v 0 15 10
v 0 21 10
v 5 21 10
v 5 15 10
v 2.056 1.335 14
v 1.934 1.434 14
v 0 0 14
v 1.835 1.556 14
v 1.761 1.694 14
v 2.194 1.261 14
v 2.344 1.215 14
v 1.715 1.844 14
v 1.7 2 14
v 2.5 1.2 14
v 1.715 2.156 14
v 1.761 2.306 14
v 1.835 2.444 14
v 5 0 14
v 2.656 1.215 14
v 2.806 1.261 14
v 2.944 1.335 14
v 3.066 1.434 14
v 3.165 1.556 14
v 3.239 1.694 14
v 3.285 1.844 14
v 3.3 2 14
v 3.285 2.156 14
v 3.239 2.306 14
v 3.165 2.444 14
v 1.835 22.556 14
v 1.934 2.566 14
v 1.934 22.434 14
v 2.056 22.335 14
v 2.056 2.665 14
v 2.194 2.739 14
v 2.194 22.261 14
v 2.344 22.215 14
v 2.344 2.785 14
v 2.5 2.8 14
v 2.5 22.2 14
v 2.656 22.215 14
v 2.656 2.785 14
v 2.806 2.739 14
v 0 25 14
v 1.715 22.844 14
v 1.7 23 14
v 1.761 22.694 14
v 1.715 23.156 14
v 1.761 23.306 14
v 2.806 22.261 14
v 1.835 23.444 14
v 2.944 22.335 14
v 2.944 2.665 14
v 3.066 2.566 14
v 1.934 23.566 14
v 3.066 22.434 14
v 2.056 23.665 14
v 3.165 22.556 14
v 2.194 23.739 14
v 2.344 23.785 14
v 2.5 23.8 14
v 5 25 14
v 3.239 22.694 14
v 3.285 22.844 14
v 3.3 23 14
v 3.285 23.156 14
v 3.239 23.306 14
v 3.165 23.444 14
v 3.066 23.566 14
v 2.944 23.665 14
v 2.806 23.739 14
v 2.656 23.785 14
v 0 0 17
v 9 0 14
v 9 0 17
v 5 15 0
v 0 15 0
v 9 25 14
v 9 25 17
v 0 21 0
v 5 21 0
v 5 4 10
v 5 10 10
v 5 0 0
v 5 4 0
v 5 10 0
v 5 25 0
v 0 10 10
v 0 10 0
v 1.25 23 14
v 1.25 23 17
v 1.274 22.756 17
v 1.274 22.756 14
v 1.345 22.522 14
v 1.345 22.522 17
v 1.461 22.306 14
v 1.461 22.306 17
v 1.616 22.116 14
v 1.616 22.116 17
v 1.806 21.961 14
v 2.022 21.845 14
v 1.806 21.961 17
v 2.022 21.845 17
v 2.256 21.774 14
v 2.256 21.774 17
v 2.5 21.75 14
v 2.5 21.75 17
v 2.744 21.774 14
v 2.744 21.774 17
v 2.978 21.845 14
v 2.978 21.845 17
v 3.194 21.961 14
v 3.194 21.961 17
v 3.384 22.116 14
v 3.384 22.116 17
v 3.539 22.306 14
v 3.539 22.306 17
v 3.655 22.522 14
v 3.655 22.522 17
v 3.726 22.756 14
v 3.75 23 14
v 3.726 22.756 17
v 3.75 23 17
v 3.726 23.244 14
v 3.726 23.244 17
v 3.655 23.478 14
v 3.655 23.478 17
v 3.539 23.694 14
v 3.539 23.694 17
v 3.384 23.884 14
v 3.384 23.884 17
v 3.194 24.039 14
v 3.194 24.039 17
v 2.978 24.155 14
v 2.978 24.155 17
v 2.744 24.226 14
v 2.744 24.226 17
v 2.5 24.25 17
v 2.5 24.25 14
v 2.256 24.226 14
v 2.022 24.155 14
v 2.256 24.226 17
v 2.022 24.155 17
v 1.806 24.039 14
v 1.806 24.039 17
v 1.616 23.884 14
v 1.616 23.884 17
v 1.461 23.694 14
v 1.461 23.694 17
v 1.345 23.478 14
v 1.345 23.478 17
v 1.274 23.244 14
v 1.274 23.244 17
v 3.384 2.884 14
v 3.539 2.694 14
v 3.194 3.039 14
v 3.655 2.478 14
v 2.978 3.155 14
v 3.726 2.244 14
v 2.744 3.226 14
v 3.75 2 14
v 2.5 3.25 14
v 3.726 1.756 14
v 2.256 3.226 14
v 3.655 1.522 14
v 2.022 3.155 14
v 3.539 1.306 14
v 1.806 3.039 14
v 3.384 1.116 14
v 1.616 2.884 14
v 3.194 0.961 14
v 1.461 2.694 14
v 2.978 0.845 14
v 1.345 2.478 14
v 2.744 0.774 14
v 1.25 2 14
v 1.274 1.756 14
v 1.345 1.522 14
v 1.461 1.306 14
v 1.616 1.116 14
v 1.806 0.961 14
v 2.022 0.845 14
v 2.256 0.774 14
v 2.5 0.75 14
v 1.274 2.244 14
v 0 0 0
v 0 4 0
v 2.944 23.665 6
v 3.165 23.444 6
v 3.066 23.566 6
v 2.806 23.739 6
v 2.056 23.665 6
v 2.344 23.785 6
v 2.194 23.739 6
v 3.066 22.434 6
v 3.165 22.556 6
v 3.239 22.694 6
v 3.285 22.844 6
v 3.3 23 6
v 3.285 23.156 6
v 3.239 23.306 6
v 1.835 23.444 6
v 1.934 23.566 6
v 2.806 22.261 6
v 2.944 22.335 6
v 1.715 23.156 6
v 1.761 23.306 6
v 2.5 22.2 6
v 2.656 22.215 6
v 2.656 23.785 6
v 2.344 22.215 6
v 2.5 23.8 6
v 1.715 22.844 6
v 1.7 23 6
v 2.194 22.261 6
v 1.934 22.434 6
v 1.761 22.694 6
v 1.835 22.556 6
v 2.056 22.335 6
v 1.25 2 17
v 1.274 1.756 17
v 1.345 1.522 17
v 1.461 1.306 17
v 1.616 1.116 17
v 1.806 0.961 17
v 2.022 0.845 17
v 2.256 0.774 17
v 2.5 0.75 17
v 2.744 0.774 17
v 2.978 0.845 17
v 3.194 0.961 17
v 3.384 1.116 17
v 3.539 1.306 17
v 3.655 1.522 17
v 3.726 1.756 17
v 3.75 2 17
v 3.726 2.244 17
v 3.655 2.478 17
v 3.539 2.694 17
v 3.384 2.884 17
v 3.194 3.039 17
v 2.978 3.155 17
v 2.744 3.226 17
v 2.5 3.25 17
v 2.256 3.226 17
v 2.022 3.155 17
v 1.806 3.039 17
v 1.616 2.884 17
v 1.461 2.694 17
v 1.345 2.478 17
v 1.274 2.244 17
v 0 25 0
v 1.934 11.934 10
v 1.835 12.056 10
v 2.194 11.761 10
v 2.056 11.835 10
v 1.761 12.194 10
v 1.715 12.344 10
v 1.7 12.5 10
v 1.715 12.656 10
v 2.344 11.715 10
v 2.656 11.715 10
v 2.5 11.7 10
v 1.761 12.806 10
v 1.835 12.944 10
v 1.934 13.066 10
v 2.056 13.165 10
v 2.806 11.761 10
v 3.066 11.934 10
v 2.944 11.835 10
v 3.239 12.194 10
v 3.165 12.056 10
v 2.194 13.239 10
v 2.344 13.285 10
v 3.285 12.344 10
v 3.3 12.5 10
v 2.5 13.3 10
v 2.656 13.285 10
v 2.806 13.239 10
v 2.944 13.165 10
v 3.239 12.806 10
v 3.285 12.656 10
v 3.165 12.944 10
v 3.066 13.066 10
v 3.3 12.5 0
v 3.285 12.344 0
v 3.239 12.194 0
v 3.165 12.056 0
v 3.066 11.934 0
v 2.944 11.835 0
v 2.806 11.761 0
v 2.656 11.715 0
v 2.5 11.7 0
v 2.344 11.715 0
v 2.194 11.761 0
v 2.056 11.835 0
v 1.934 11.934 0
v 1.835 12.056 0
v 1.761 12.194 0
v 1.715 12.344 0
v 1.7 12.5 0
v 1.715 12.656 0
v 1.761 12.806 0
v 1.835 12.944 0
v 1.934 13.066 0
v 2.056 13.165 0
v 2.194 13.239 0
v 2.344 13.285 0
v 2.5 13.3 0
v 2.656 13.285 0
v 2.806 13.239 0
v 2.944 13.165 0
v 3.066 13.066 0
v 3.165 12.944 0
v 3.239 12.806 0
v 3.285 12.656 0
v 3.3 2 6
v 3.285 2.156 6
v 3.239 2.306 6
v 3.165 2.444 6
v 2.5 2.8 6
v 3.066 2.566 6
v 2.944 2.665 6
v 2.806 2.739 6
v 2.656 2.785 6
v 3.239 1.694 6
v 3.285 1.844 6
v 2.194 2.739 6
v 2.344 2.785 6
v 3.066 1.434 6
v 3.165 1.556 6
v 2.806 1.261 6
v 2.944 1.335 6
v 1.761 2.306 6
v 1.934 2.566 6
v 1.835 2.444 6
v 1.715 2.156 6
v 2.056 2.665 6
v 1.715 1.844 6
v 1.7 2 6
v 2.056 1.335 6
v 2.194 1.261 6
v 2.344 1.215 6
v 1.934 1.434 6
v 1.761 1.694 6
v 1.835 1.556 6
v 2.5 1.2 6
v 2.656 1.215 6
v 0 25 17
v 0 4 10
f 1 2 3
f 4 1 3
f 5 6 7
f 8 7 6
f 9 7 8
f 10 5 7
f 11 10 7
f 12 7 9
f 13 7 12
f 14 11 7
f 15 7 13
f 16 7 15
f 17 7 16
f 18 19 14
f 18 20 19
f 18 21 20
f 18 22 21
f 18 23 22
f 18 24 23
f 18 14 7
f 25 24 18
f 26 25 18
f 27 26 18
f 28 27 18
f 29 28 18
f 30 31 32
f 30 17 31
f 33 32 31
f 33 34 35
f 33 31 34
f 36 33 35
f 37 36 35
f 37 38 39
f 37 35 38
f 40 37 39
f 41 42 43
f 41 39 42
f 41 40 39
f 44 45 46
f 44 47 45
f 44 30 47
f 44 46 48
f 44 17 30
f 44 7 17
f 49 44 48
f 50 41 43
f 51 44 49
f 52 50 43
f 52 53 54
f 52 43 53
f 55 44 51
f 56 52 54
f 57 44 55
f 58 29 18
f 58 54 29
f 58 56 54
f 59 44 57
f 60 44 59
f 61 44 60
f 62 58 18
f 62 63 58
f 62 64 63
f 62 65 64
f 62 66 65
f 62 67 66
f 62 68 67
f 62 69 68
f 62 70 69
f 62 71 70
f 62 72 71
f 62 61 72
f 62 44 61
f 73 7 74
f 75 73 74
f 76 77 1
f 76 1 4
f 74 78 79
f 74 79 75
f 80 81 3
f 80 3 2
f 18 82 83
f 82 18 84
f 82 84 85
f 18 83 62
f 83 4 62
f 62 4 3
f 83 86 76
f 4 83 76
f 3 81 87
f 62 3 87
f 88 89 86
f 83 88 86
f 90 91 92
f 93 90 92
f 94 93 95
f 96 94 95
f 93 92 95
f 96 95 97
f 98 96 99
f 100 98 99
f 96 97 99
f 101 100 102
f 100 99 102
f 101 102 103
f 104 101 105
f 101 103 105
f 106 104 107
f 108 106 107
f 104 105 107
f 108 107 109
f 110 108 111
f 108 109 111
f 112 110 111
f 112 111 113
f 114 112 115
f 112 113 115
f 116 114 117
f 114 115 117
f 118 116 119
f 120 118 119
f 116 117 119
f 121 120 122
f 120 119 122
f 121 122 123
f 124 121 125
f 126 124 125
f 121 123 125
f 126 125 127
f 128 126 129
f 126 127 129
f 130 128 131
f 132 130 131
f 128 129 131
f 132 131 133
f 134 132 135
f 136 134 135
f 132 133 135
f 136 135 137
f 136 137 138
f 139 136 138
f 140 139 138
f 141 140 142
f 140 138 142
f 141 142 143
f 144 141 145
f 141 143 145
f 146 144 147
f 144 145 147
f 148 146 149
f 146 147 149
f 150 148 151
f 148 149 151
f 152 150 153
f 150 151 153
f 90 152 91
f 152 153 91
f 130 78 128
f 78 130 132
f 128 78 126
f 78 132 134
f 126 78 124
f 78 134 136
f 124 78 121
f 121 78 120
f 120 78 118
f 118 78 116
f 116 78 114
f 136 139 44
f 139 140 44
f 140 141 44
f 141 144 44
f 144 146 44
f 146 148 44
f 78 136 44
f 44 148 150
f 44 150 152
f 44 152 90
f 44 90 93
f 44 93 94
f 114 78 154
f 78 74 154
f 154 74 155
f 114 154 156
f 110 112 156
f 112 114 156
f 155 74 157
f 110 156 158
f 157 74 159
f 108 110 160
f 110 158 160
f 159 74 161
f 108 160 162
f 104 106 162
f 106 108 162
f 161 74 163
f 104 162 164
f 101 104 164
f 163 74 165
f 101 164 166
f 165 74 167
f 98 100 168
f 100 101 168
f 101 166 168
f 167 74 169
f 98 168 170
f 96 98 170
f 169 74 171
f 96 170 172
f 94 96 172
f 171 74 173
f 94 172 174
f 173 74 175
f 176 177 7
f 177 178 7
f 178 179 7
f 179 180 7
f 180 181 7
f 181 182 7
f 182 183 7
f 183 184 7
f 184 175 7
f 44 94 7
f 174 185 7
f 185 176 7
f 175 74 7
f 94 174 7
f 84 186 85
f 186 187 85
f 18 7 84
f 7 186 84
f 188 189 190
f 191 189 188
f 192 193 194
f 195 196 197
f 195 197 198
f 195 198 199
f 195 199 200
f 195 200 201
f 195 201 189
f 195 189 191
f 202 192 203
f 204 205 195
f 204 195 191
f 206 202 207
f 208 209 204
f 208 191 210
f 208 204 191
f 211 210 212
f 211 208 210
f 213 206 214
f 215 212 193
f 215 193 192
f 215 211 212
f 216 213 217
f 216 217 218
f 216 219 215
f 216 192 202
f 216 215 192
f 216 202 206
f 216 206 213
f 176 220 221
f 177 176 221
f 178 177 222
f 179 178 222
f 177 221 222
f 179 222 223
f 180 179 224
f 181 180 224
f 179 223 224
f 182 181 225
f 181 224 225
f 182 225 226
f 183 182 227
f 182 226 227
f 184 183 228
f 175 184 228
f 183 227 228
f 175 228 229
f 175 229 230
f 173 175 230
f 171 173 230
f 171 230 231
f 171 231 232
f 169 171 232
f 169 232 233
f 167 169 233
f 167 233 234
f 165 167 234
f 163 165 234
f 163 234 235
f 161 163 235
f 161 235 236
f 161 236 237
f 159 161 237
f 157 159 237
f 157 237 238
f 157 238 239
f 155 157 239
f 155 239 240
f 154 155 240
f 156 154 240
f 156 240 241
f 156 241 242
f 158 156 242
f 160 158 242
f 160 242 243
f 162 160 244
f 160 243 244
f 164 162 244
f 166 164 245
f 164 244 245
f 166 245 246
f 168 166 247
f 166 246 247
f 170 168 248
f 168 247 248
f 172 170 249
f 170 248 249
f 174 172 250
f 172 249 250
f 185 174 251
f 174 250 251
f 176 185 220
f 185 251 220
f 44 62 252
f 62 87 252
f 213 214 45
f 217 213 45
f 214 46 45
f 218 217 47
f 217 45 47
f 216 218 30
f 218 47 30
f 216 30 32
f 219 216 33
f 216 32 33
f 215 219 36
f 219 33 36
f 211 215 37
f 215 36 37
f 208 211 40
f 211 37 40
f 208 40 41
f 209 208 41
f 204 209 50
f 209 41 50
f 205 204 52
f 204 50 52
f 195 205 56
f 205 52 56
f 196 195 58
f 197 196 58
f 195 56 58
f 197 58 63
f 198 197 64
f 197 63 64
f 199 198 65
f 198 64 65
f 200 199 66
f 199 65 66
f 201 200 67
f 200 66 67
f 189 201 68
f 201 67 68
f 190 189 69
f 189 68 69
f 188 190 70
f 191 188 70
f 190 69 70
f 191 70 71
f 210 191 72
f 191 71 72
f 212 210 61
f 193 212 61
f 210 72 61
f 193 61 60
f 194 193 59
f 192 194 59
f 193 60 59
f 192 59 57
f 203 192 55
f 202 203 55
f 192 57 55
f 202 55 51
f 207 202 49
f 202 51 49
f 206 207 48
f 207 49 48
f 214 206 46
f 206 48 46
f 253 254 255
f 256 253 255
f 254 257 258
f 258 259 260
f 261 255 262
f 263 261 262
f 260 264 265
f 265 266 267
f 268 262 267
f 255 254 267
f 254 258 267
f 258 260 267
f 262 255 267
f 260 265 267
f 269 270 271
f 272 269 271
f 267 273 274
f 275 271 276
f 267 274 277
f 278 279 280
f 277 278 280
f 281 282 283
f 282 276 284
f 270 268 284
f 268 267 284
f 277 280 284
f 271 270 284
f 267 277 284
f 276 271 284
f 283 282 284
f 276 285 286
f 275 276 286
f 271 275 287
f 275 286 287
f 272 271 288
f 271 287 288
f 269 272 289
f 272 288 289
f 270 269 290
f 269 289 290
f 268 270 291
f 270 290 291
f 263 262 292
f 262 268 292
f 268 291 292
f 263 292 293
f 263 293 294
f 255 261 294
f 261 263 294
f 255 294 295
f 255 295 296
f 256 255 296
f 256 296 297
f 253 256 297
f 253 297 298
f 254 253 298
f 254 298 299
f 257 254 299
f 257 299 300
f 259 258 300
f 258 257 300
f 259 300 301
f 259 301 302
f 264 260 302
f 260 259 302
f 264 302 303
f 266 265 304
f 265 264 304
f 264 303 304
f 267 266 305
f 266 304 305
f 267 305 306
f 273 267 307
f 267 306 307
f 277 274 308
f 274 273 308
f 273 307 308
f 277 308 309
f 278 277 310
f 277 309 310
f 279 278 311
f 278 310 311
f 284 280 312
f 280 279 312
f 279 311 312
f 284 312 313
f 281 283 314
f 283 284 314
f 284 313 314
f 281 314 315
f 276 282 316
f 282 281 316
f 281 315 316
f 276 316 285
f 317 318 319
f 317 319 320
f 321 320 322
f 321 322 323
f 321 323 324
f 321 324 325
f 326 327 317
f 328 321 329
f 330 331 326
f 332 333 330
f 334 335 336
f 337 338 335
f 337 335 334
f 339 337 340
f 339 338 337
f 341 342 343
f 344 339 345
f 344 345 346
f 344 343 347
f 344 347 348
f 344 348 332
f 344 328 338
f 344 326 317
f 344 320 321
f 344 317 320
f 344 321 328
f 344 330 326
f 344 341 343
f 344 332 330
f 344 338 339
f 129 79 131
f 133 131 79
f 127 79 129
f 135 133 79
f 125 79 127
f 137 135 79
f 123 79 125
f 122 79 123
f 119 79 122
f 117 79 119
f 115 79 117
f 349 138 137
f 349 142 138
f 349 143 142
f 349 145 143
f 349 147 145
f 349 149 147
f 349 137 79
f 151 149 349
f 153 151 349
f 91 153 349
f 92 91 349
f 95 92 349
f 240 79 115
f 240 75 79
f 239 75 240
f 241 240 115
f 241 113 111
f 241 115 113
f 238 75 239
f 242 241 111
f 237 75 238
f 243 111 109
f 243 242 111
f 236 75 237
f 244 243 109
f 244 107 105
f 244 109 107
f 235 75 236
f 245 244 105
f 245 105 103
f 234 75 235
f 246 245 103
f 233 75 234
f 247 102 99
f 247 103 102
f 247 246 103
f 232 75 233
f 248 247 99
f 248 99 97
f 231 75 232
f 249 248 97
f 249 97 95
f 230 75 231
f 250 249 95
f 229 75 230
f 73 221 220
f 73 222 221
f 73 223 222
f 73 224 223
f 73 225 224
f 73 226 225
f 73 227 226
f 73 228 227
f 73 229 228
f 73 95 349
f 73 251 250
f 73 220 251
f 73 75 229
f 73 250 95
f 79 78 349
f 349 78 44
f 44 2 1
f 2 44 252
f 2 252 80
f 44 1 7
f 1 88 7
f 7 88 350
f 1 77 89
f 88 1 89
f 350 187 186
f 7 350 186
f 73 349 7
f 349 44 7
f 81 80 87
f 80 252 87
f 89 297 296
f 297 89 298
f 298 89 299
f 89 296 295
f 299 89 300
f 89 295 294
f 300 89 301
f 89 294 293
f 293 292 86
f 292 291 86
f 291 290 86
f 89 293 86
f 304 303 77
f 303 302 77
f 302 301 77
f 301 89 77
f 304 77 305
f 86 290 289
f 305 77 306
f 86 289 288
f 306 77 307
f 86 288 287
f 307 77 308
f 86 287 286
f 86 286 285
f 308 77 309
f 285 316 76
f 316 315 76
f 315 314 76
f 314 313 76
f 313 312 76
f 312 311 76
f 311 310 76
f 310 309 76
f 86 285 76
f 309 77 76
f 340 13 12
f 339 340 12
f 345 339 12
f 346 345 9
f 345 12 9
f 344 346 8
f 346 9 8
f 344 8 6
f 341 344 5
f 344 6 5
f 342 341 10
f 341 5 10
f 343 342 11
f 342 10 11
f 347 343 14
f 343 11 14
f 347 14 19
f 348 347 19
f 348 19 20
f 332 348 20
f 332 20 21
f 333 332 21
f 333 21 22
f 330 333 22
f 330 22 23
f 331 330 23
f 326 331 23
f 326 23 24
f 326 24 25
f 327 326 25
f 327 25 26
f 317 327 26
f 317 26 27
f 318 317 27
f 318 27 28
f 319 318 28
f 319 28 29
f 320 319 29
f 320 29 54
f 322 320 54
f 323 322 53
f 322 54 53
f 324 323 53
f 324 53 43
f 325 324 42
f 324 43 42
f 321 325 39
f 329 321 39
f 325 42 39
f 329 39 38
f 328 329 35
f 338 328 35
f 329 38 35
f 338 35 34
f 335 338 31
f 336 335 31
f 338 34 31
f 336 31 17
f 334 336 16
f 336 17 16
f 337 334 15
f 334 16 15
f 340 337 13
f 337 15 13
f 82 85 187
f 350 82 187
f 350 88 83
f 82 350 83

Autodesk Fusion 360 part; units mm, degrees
sketch "Sketch1" plane through (0, 0, 0) normal (0, 0, 1) x (1, 0, 0)
  line L0 (0, 0) -> (5, 0)
  line L1 (5, 0) -> (5, 25)
  line L2 (5, 25) -> (0, 25)
  line L3 (0, 25) -> (0, 0)
  circle A0 centre (2.5, 12.5) radius 0.8
  line L4 (0, 10) -> (5, 10)
  line L5 (5, 10) -> (5, 4)
  line L6 (5, 4) -> (0, 4)
  line L7 (0, 4) -> (0, 10)
  line L8 (0, 15) -> (3, 15)
  line L9 (3, 15) -> (3, 14)
  line L10 (3, 14) -> (0, 14)
  line L11 (0, 14) -> (0, 15)
  line L12 (0, 15) -> (5, 15)
  line L13 (5, 15) -> (5, 21)
  line L14 (5, 21) -> (0, 21)
  line L15 (0, 21) -> (0, 15)
  dimension "d1" = 5
  dimension "d2" = 25
  dimension "d3" = 1.6
  dimension "d8" = 6
  dimension "d9" = 6
extrude "Extrude1" add sketch "Sketch1" along normal blind 14 contours L0 L1 L3 L6 | L1 L3 L4 L5 L6 L7 | L1 L3 L4 L9 L10 L12 | L3 L8 L9 L10 L11 L12 | L1 L3 L8 L12 L13 L14 L15 | L1 L2 L3 L14 | A0 makes body 1
extrude "Extrude2" cut sketch "Sketch1" along normal blind 10 contours A0 bodies 1
extrude "Extrude3" cut sketch "Sketch1" along normal blind 10 contours L1 L3 L8 L12 L13 L14 L15 bodies 1
extrude "Extrude4" cut sketch "Sketch1" along normal blind 10 contours L1 L3 L4 L5 L6 L7 bodies 1
sketch "Sketch2" plane through (0, 0, 14) normal (0, 0, 1) x (-1, 0, 0)
  line L0 (0, -25) -> (0, 0)
  line L1 (0, 0) -> (-5, 0)
  line L2 (-5, 0) -> (-5, -25)
  line L3 (-5, -25) -> (0, -25)
  line L4 (0, -25) -> (-9, -25)
  line L5 (-9, -25) -> (-9, 0)
  line L6 (-9, 0) -> (0, 0)
  line L7 (0, 0) -> (0, -25)
extrude "Extrude5" add sketch "Sketch2" along normal blind 3 separate body makes body 2
sketch "Sketch3" plane through (0, 0, 17) normal (0, 0, 1) x (-1, 0, 0)
  line L0 (0, 0) -> (-9, 0)
  line L1 (-9, 0) -> (-9, -25)
  line L2 (-9, -25) -> (0, -25)
  line L3 (0, -25) -> (0, 0)
  line L4 (0, 0) -> (-5, 0)
  circle A0 centre (-2.5, -2) radius 0.8
  line L5 (-5, -25) -> (0, -25)
  circle A1 centre (-2.5, -23) radius 0.8
  circle A2 centre (-2.5, -2) radius 1.25
  circle A3 centre (-2.5, -23) radius 1.25
  dimension "d16" = 1.6
  dimension "d18" = 1.6
  dimension "d21" = 2.5
  dimension "d22" = 2.5
extrude "Extrude6" cut sketch "Sketch3" against normal blind 11 contours A0 | A1 bodies 1 2
extrude "Extrude7" cut sketch "Sketch3" against normal blind 3 contours A1 | A2 bodies 2
extrude "Extrude8" cut sketch "Sketch3" against normal blind 3 contours A3 bodies 2
extrude "Extrude9" add sketch "Sketch3" against normal blind 3 contours A3 bodies 2
extrude "Extrude10" cut sketch "Sketch3" against normal blind 3 contours A3 bodies 2
